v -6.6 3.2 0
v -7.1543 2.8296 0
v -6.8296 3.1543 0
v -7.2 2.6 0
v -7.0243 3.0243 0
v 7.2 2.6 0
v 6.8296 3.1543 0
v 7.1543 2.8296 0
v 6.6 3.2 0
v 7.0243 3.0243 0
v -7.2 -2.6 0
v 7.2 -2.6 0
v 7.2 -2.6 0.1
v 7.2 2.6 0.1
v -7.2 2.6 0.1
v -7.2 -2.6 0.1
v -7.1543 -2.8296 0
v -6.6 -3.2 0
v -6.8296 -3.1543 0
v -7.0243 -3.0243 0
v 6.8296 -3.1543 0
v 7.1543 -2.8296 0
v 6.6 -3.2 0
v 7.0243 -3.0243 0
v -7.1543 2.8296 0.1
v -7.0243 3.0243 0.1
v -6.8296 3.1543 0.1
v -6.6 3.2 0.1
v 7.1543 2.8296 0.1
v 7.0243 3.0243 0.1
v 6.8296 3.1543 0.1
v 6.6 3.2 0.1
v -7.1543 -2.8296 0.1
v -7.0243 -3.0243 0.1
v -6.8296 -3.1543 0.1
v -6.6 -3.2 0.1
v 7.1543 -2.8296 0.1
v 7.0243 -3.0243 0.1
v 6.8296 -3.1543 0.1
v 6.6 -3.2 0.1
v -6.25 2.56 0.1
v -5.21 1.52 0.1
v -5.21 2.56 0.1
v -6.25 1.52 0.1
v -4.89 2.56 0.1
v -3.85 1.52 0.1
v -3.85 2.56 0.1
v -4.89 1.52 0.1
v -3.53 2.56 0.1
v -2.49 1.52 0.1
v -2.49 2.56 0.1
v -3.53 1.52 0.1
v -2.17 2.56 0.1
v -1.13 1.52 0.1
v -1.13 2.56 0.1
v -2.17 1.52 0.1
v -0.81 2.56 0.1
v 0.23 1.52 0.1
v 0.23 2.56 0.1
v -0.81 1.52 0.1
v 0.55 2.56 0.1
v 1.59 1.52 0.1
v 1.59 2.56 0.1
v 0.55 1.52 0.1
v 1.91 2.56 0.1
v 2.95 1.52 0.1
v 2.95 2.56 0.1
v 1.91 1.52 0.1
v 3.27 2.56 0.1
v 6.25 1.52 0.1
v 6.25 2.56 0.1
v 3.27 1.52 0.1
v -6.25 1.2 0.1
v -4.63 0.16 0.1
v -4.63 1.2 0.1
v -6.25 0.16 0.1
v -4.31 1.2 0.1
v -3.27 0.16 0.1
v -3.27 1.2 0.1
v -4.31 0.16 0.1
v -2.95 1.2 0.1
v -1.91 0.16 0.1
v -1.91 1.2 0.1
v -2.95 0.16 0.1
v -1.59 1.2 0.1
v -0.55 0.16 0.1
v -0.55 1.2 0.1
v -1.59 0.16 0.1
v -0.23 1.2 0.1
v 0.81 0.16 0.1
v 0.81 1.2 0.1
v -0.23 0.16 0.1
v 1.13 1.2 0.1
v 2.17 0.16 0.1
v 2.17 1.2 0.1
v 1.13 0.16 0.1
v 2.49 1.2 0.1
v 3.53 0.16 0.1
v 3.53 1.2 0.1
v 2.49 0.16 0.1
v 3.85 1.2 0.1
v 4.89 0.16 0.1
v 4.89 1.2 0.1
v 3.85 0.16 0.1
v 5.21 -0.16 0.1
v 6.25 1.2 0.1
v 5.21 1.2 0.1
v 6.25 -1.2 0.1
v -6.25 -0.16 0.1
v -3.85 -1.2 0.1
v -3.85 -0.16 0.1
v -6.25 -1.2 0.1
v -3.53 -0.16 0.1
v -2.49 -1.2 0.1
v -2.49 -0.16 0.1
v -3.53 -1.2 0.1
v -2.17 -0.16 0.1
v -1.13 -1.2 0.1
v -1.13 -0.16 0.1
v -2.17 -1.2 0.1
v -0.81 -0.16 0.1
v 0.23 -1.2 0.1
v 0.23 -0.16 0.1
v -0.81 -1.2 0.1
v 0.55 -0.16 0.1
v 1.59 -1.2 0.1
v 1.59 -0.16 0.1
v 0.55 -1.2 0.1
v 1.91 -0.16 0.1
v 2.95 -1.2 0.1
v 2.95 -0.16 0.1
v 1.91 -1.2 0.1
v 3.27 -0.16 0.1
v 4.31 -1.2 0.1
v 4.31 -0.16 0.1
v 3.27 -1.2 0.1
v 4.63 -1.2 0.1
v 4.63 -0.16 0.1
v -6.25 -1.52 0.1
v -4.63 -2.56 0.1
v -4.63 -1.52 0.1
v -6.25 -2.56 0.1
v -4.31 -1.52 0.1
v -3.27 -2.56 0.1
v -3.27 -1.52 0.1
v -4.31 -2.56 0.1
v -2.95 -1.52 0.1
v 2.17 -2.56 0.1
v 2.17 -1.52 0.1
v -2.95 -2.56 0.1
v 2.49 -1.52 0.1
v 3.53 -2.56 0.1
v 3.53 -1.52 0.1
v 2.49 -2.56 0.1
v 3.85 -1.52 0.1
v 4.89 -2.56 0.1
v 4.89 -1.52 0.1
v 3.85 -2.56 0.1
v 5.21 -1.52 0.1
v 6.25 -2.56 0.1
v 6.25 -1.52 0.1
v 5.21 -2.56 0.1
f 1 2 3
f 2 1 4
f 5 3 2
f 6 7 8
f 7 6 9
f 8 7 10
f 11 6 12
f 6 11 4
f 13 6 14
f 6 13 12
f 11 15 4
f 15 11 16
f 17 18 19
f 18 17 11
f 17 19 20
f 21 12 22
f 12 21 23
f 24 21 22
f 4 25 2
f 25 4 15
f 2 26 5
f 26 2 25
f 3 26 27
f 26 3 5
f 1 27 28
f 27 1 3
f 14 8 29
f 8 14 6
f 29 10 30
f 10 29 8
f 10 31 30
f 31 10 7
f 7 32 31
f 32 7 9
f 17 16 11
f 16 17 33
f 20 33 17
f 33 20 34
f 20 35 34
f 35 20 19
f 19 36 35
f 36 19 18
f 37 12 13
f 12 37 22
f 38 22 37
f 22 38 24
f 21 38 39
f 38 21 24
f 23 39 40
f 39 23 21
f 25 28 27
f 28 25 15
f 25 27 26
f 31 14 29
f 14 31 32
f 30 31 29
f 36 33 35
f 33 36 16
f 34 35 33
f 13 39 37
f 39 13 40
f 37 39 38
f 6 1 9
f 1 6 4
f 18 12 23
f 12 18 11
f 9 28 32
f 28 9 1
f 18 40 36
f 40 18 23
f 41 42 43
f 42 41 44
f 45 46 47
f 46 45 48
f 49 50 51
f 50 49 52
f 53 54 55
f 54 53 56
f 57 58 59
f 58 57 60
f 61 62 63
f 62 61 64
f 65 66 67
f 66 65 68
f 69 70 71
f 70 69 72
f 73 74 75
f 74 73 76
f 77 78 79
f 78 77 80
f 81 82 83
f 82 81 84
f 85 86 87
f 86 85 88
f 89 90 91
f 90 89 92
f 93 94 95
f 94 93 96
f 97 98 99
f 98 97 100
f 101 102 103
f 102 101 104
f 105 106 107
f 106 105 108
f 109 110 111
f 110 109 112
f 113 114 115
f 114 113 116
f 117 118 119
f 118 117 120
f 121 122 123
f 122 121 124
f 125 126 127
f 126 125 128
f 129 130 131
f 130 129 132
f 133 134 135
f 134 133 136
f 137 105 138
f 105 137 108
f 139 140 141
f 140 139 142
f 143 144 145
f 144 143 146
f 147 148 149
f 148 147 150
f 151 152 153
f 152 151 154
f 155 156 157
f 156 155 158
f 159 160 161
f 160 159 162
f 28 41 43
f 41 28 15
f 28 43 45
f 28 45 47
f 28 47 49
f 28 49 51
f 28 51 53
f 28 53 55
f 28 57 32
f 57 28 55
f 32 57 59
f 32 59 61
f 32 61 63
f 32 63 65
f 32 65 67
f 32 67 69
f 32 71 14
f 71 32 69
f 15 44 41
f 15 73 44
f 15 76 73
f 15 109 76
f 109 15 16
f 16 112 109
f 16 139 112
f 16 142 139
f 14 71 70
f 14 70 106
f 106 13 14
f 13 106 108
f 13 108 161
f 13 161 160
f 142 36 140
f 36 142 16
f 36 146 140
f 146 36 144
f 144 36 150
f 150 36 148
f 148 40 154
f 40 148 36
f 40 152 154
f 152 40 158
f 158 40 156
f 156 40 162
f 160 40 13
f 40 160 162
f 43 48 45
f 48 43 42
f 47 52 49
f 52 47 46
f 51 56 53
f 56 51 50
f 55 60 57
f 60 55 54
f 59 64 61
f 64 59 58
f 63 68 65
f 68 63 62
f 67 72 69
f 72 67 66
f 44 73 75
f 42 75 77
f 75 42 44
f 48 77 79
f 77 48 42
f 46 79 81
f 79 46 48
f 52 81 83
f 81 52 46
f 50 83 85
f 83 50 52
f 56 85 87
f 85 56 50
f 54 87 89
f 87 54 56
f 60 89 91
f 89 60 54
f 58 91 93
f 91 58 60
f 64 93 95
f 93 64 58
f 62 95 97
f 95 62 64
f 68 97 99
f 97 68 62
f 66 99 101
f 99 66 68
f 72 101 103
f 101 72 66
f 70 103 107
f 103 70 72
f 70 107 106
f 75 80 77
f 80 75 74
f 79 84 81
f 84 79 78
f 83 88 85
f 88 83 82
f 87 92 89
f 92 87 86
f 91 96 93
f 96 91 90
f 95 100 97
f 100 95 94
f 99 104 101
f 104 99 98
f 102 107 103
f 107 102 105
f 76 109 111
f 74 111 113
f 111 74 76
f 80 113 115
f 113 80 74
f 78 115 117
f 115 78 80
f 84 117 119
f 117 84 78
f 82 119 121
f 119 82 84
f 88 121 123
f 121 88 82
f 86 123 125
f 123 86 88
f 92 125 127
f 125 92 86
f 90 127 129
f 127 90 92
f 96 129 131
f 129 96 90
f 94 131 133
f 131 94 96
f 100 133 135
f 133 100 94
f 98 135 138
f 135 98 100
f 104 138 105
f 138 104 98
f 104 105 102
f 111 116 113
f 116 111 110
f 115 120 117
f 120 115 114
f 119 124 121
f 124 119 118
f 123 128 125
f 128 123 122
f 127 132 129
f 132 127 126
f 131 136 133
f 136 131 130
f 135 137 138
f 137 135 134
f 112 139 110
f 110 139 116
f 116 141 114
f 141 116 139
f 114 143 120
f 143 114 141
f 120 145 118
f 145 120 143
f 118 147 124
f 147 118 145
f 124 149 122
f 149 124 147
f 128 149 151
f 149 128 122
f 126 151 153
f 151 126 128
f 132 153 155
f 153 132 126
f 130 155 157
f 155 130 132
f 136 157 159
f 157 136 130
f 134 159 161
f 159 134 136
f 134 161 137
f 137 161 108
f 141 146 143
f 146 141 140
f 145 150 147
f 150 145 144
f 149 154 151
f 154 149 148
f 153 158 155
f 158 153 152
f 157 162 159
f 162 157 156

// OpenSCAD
// file: ../p/box3u12.scad
use <../lib.scad>
function ldraw_lib__box3u12() = [
// 0 Box with 3 Parallel Faces without Any Edges
// 0 Name: box3u12.dat
// 0 Author: J.C. Tchang [tchang]
// 0 !LDRAW_ORG Primitive UPDATE 2014-02
// 0 !LICENSE Licensed under CC BY 4.0 : see CAreadme.txt
// 
// 0 BFC CERTIFY CCW
  [0,"BFC","CERTIFY"],
  [0,"BFC","CCW"],
// 
// 0 !HISTORY 2014-12-23 [PTadmin] Official Update 2014-02
// 
// 
// 4 16 -1 1 1 1 1 1 1 1 -1 -1 1 -1
  [4,16,-1,1,1,1,1,1,1,1,-1,-1,1,-1],
// 4 16 -1 1 1 -1 0 1 1 0 1 1 1 1
  [4,16,-1,1,1,-1,0,1,1,0,1,1,1,1],
// 4 16 1 1 -1 1 0 -1 -1 0 -1 -1 1 -1
  [4,16,1,1,-1,1,0,-1,-1,0,-1,-1,1,-1],
];
module ldraw_lib__box3u12(step=0, col=false, unit=2/5, alt=false, line=0.2, solid=!$preview)
    makepoly(ldraw_lib__box3u12(), step=step, col=col, unit=unit, alt=alt, line=line, solid=solid);
ldraw_lib__box3u12(line=0.2);
// file: ../p/1-4cyli.scad
use <../lib.scad>
function ldraw_lib__1_4cyli() = [
// 0 Cylinder 0.25
// 0 Name: 1-4cyli.dat
// 0 Author: James Jessiman
// 0 !LDRAW_ORG Primitive UPDATE 2012-01
// 0 !LICENSE Licensed under CC BY 4.0 : see CAreadme.txt
// 
// 0 BFC CERTIFY CCW
  [0,"BFC","CERTIFY"],
  [0,"BFC","CCW"],
// 
// 0 !HISTORY 2002-03-23 [sbliss] Added BFC statement.
// 0 !HISTORY 2002-04-25 [PTadmin] Official Update 2002-02
// 0 !HISTORY 2007-06-22 [PTadmin] Header formatted for Contributor Agreement
// 0 !HISTORY 2008-07-01 [PTadmin] Official Update 2008-01
// 0 !HISTORY 2012-02-16 [Philo] Changed to CCW
// 0 !HISTORY 2012-03-30 [PTadmin] Official Update 2012-01
// 
// 
// 4 16 1 1 0 0.9239 1 0.3827 0.9239 0 0.3827 1 0 0
  [4,16,1,1,0,0.9239,1,0.3827,0.9239,0,0.3827,1,0,0],
// 5 24 1 0 0 1 1 0 0.9239 0 0.3827 1 0 -1
  [5,24,1,0,0,1,1,0,0.9239,0,0.3827,1,0,-1],
// 4 16 0.9239 1 0.3827 0.7071 1 0.7071 0.7071 0 0.7071 0.9239 0 0.3827
  [4,16,0.9239,1,0.3827,0.7071,1,0.7071,0.7071,0,0.7071,0.9239,0,0.3827],
// 5 24 0.9239 0 0.3827 0.9239 1 0.3827 0.7071 0 0.7071 1 0 0
  [5,24,0.9239,0,0.3827,0.9239,1,0.3827,0.7071,0,0.7071,1,0,0],
// 4 16 0.7071 1 0.7071 0.3827 1 0.9239 0.3827 0 0.9239 0.7071 0 0.7071
  [4,16,0.7071,1,0.7071,0.3827,1,0.9239,0.3827,0,0.9239,0.7071,0,0.7071],
// 5 24 0.7071 0 0.7071 0.7071 1 0.7071 0.3827 0 0.9239 0.9239 0 0.3827
  [5,24,0.7071,0,0.7071,0.7071,1,0.7071,0.3827,0,0.9239,0.9239,0,0.3827],
// 4 16 0.3827 1 0.9239 0 1 1 0 0 1 0.3827 0 0.9239
  [4,16,0.3827,1,0.9239,0,1,1,0,0,1,0.3827,0,0.9239],
// 5 24 0.3827 0 0.9239 0.3827 1 0.9239 0 0 1 0.7071 0 0.7071
  [5,24,0.3827,0,0.9239,0.3827,1,0.9239,0,0,1,0.7071,0,0.7071],
// 5 24 0 0 1 0 1 1 0.3827 0 0.9239 -1 0 1
  [5,24,0,0,1,0,1,1,0.3827,0,0.9239,-1,0,1],
];
module ldraw_lib__1_4cyli(step=0, col=false, unit=2/5, alt=false, line=0.2, solid=!$preview)
    makepoly(ldraw_lib__1_4cyli(), step=step, col=col, unit=unit, alt=alt, line=line, solid=solid);
ldraw_lib__1_4cyli(line=0.2);
// file: ../p/1-4chrd.scad
use <../lib.scad>
function ldraw_lib__1_4chrd() = [
// 0 Chord 0.25
// 0 Name: 1-4chrd.dat
// 0 Author: Max Martin Richter [MMR1988]
// 0 !LDRAW_ORG Primitive UPDATE 2023-05
// 0 !LICENSE Licensed under CC BY 4.0 : see CAreadme.txt
// 
// 0 BFC CERTIFY CCW
  [0,"BFC","CERTIFY"],
  [0,"BFC","CCW"],
// 
// 0 !HISTORY 2004-04-22 [PTadmin] Official Update 2004-02
// 0 !HISTORY 2007-10-09 [PTadmin] Header formatted for Contributor Agreement
// 0 !HISTORY 2008-07-01 [PTadmin] Official Update 2008-01
// 0 !HISTORY 2012-08-02 [MMR1988] Re-creation with PrimGen2 and Rectifier
// 0 !HISTORY 2012-08-09 [PTadmin] Official Update 2012-02
// 0 !HISTORY 2023-10-27 [OrionP] Change author to MMR1988 from hafhead
// 0 !HISTORY 2023-10-31 [OrionP] Official Update 2023-05
// 
// 4 16 0.9239 0 0.3827 0.3827 0 0.9239 0 0 1 1 0 0
  [4,16,0.9239,0,0.3827,0.3827,0,0.9239,0,0,1,1,0,0],
// 3 16 0.7071 0 0.7071 0.3827 0 0.9239 0.9239 0 0.3827
  [3,16,0.7071,0,0.7071,0.3827,0,0.9239,0.9239,0,0.3827],
];
module ldraw_lib__1_4chrd(step=0, col=false, unit=2/5, alt=false, line=0.2, solid=!$preview)
    makepoly(ldraw_lib__1_4chrd(), step=step, col=col, unit=unit, alt=alt, line=line, solid=solid);
ldraw_lib__1_4chrd(line=0.2);
// main file
use <../lib.scad>
use <../p/1-4chrd.scad>
use <../p/1-4cyli.scad>
use <../p/box3u12.scad>
function ldraw_lib__6148328o() = [
// 0 Sticker  0.8 x  1.8 with Black Keyboard on Light Grey Background
// 0 Name: 6148328o.dat
// 0 Author: Massimo Maso [Sirio]
// 0 !LDRAW_ORG Part UPDATE 2024-08
// 0 !LICENSE Licensed under CC BY 4.0 : see CAreadme.txt
// 
// 0 BFC CERTIFY CCW
  [0,"BFC","CERTIFY"],
  [0,"BFC","CCW"],
// 
// 0 !KEYWORDS 917K, 919, Bricklink 75876stk01, Brickowl 852010, Hybrid, Pit Lane
// 0 !KEYWORDS Porsche, Rebrickable 26357, set 75876, Speed Champions
// 
// 0 !HISTORY 2024-09-30 [OrionP] Official Update 2024-08
// 
// 0 // Primitives
// 1 16 -16.5 0 6.5 -1.5 0 0 0 -1 0 0 0 1.5 1-4chrd.dat
  [1,16,-16.5,0,6.5,-1.5,0,0,0,-1,0,0,0,1.5, ldraw_lib__1_4chrd()],
// 1 16 16.5 0 6.5 1.5 0 0 0 -1 0 0 0 1.5 1-4chrd.dat
  [1,16,16.5,0,6.5,1.5,0,0,0,-1,0,0,0,1.5, ldraw_lib__1_4chrd()],
// 1 16 0 -.25 0 0 0 18 0 .25 0 6.5 0 0 box3u12.dat
  [1,16,0,-.25,0,0,0,18,0,.25,0,6.5,0,0, ldraw_lib__box3u12()],
// 1 16 -16.5 0 -6.5 -1.5 0 0 0 -1 0 0 0 -1.5 1-4chrd.dat
  [1,16,-16.5,0,-6.5,-1.5,0,0,0,-1,0,0,0,-1.5, ldraw_lib__1_4chrd()],
// 1 16 16.5 0 -6.5 1.5 0 0 0 -1 0 0 0 -1.5 1-4chrd.dat
  [1,16,16.5,0,-6.5,1.5,0,0,0,-1,0,0,0,-1.5, ldraw_lib__1_4chrd()],
// 1 16 -16.5 0 6.5 -1.5 0 0 0 -.25 0 0 0 1.5 1-4cyli.dat
  [1,16,-16.5,0,6.5,-1.5,0,0,0,-.25,0,0,0,1.5, ldraw_lib__1_4cyli()],
// 1 16 16.5 0 6.5 1.5 0 0 0 -.25 0 0 0 1.5 1-4cyli.dat
  [1,16,16.5,0,6.5,1.5,0,0,0,-.25,0,0,0,1.5, ldraw_lib__1_4cyli()],
// 1 16 -16.5 0 -6.5 -1.5 0 0 0 -.25 0 0 0 -1.5 1-4cyli.dat
  [1,16,-16.5,0,-6.5,-1.5,0,0,0,-.25,0,0,0,-1.5, ldraw_lib__1_4cyli()],
// 1 16 16.5 0 -6.5 1.5 0 0 0 -.25 0 0 0 -1.5 1-4cyli.dat
  [1,16,16.5,0,-6.5,1.5,0,0,0,-.25,0,0,0,-1.5, ldraw_lib__1_4cyli()],
// 1 71 -16.5 -.25 6.5 -1.5 0 0 0 1 0 0 0 1.5 1-4chrd.dat
  [1,71,-16.5,-.25,6.5,-1.5,0,0,0,1,0,0,0,1.5, ldraw_lib__1_4chrd()],
// 1 71 16.5 -.25 6.5 1.5 0 0 0 1 0 0 0 1.5 1-4chrd.dat
  [1,71,16.5,-.25,6.5,1.5,0,0,0,1,0,0,0,1.5, ldraw_lib__1_4chrd()],
// 1 71 -16.5 -.25 -6.5 -1.5 0 0 0 1 0 0 0 -1.5 1-4chrd.dat
  [1,71,-16.5,-.25,-6.5,-1.5,0,0,0,1,0,0,0,-1.5, ldraw_lib__1_4chrd()],
// 1 71 16.5 -.25 -6.5 1.5 0 0 0 1 0 0 0 -1.5 1-4chrd.dat
  [1,71,16.5,-.25,-6.5,1.5,0,0,0,1,0,0,0,-1.5, ldraw_lib__1_4chrd()],
// 0 // Bottom faces
// 4 16 16.5 0 8 18 0 6.5 -18 0 6.5 -16.5 0 8
  [4,16,16.5,0,8,18,0,6.5,-18,0,6.5,-16.5,0,8],
// 4 16 16.5 0 -8 -16.5 0 -8 -18 0 -6.5 18 0 -6.5
  [4,16,16.5,0,-8,-16.5,0,-8,-18,0,-6.5,18,0,-6.5],
// 0 // Lateral faces
// 4 16 -16.5 0 8 -16.5 -.25 8 16.5 -.25 8 16.5 0 8
  [4,16,-16.5,0,8,-16.5,-.25,8,16.5,-.25,8,16.5,0,8],
// 4 16 -16.5 0 -8 16.5 0 -8 16.5 -.25 -8 -16.5 -.25 -8
  [4,16,-16.5,0,-8,16.5,0,-8,16.5,-.25,-8,-16.5,-.25,-8],
// 0 // Top faces
// 0 // Black buttons
// 4 0 -15.625 -.25 6.4 -15.625 -.25 3.8 -13.025 -.25 3.8 -13.025 -.25 6.4
  [4,0,-15.625,-.25,6.4,-15.625,-.25,3.8,-13.025,-.25,3.8,-13.025,-.25,6.4],
// 4 0 -12.225 -.25 6.4 -12.225 -.25 3.8 -9.625 -.25 3.8 -9.625 -.25 6.4
  [4,0,-12.225,-.25,6.4,-12.225,-.25,3.8,-9.625,-.25,3.8,-9.625,-.25,6.4],
// 4 0 -8.825 -.25 6.4 -8.825 -.25 3.8 -6.225 -.25 3.8 -6.225 -.25 6.4
  [4,0,-8.825,-.25,6.4,-8.825,-.25,3.8,-6.225,-.25,3.8,-6.225,-.25,6.4],
// 4 0 -5.425 -.25 6.4 -5.425 -.25 3.8 -2.825 -.25 3.8 -2.825 -.25 6.4
  [4,0,-5.425,-.25,6.4,-5.425,-.25,3.8,-2.825,-.25,3.8,-2.825,-.25,6.4],
// 4 0 -2.025 -.25 6.4 -2.025 -.25 3.8 .575 -.25 3.8 .575 -.25 6.4
  [4,0,-2.025,-.25,6.4,-2.025,-.25,3.8,.575,-.25,3.8,.575,-.25,6.4],
// 4 0 1.375 -.25 6.4 1.375 -.25 3.8 3.975 -.25 3.8 3.975 -.25 6.4
  [4,0,1.375,-.25,6.4,1.375,-.25,3.8,3.975,-.25,3.8,3.975,-.25,6.4],
// 4 0 4.775 -.25 6.4 4.775 -.25 3.8 7.375 -.25 3.8 7.375 -.25 6.4
  [4,0,4.775,-.25,6.4,4.775,-.25,3.8,7.375,-.25,3.8,7.375,-.25,6.4],
// 4 0 8.175 -.25 6.4 8.175 -.25 3.8 15.625 -.25 3.8 15.625 -.25 6.4
  [4,0,8.175,-.25,6.4,8.175,-.25,3.8,15.625,-.25,3.8,15.625,-.25,6.4],
// 4 0 -15.625 -.25 3 -15.625 -.25 .4 -11.575 -.25 .4 -11.575 -.25 3
  [4,0,-15.625,-.25,3,-15.625,-.25,.4,-11.575,-.25,.4,-11.575,-.25,3],
// 4 0 -10.775 -.25 3 -10.775 -.25 .4 -8.175 -.25 .4 -8.175 -.25 3
  [4,0,-10.775,-.25,3,-10.775,-.25,.4,-8.175,-.25,.4,-8.175,-.25,3],
// 4 0 -7.375 -.25 3 -7.375 -.25 .4 -4.775 -.25 .4 -4.775 -.25 3
  [4,0,-7.375,-.25,3,-7.375,-.25,.4,-4.775,-.25,.4,-4.775,-.25,3],
// 4 0 -3.975 -.25 3 -3.975 -.25 .4 -1.375 -.25 .4 -1.375 -.25 3
  [4,0,-3.975,-.25,3,-3.975,-.25,.4,-1.375,-.25,.4,-1.375,-.25,3],
// 4 0 -.575 -.25 3 -.575 -.25 .4 2.025 -.25 .4 2.025 -.25 3
  [4,0,-.575,-.25,3,-.575,-.25,.4,2.025,-.25,.4,2.025,-.25,3],
// 4 0 2.825 -.25 3 2.825 -.25 .4 5.425 -.25 .4 5.425 -.25 3
  [4,0,2.825,-.25,3,2.825,-.25,.4,5.425,-.25,.4,5.425,-.25,3],
// 4 0 6.225 -.25 3 6.225 -.25 .4 8.825 -.25 .4 8.825 -.25 3
  [4,0,6.225,-.25,3,6.225,-.25,.4,8.825,-.25,.4,8.825,-.25,3],
// 4 0 9.625 -.25 3 9.625 -.25 .4 12.225 -.25 .4 12.225 -.25 3
  [4,0,9.625,-.25,3,9.625,-.25,.4,12.225,-.25,.4,12.225,-.25,3],
// 4 0 13.025 -.25 3 13.025 -.25 -.4 15.625 -.25 -3 15.625 -.25 3
  [4,0,13.025,-.25,3,13.025,-.25,-.4,15.625,-.25,-3,15.625,-.25,3],
// 4 0 -15.625 -.25 -.4 -15.625 -.25 -3 -9.625 -.25 -3 -9.625 -.25 -.4
  [4,0,-15.625,-.25,-.4,-15.625,-.25,-3,-9.625,-.25,-3,-9.625,-.25,-.4],
// 4 0 -8.825 -.25 -.4 -8.825 -.25 -3 -6.225 -.25 -3 -6.225 -.25 -.4
  [4,0,-8.825,-.25,-.4,-8.825,-.25,-3,-6.225,-.25,-3,-6.225,-.25,-.4],
// 4 0 -5.425 -.25 -.4 -5.425 -.25 -3 -2.825 -.25 -3 -2.825 -.25 -.4
  [4,0,-5.425,-.25,-.4,-5.425,-.25,-3,-2.825,-.25,-3,-2.825,-.25,-.4],
// 4 0 -2.025 -.25 -.4 -2.025 -.25 -3 .575 -.25 -3 .575 -.25 -.4
  [4,0,-2.025,-.25,-.4,-2.025,-.25,-3,.575,-.25,-3,.575,-.25,-.4],
// 4 0 1.375 -.25 -.4 1.375 -.25 -3 3.975 -.25 -3 3.975 -.25 -.4
  [4,0,1.375,-.25,-.4,1.375,-.25,-3,3.975,-.25,-3,3.975,-.25,-.4],
// 4 0 4.775 -.25 -.4 4.775 -.25 -3 7.375 -.25 -3 7.375 -.25 -.4
  [4,0,4.775,-.25,-.4,4.775,-.25,-3,7.375,-.25,-3,7.375,-.25,-.4],
// 4 0 8.175 -.25 -.4 8.175 -.25 -3 10.775 -.25 -3 10.775 -.25 -.4
  [4,0,8.175,-.25,-.4,8.175,-.25,-3,10.775,-.25,-3,10.775,-.25,-.4],
// 4 0 11.575 -.25 -.4 11.575 -.25 -3 15.625 -.25 -3 13.025 -.25 -.4
  [4,0,11.575,-.25,-.4,11.575,-.25,-3,15.625,-.25,-3,13.025,-.25,-.4],
// 4 0 -15.625 -.25 -3.8 -15.625 -.25 -6.4 -11.575 -.25 -6.4 -11.575 -.25 -3.8
  [4,0,-15.625,-.25,-3.8,-15.625,-.25,-6.4,-11.575,-.25,-6.4,-11.575,-.25,-3.8],
// 4 0 -10.775 -.25 -3.8 -10.775 -.25 -6.4 -8.175 -.25 -6.4 -8.175 -.25 -3.8
  [4,0,-10.775,-.25,-3.8,-10.775,-.25,-6.4,-8.175,-.25,-6.4,-8.175,-.25,-3.8],
// 4 0 -7.375 -.25 -3.8 -7.375 -.25 -6.4 5.425 -.25 -6.4 5.425 -.25 -3.8
  [4,0,-7.375,-.25,-3.8,-7.375,-.25,-6.4,5.425,-.25,-6.4,5.425,-.25,-3.8],
// 4 0 8.825 -.25 -3.8 6.225 -.25 -3.8 6.225 -.25 -6.4 8.825 -.25 -6.4
  [4,0,8.825,-.25,-3.8,6.225,-.25,-3.8,6.225,-.25,-6.4,8.825,-.25,-6.4],
// 4 0 12.225 -.25 -3.8 9.625 -.25 -3.8 9.625 -.25 -6.4 12.225 -.25 -6.4
  [4,0,12.225,-.25,-3.8,9.625,-.25,-3.8,9.625,-.25,-6.4,12.225,-.25,-6.4],
// 4 0 15.625 -.25 -3.8 13.025 -.25 -3.8 13.025 -.25 -6.4 15.625 -.25 -6.4
  [4,0,15.625,-.25,-3.8,13.025,-.25,-3.8,13.025,-.25,-6.4,15.625,-.25,-6.4],
// 0 // Grey bavkground
// 4 71 -16.5 -.25 8 -18 -.25 6.5 -15.625 -.25 6.4 -13.025 -.25 6.4
  [4,71,-16.5,-.25,8,-18,-.25,6.5,-15.625,-.25,6.4,-13.025,-.25,6.4],
// 3 71 -16.5 -.25 8 -13.025 -.25 6.4 -12.225 -.25 6.4
  [3,71,-16.5,-.25,8,-13.025,-.25,6.4,-12.225,-.25,6.4],
// 3 71 -16.5 -.25 8 -12.225 -.25 6.4 -9.625 -.25 6.4
  [3,71,-16.5,-.25,8,-12.225,-.25,6.4,-9.625,-.25,6.4],
// 3 71 -16.5 -.25 8 -9.625 -.25 6.4 -8.825 -.25 6.4
  [3,71,-16.5,-.25,8,-9.625,-.25,6.4,-8.825,-.25,6.4],
// 3 71 -16.5 -.25 8 -8.825 -.25 6.4 -6.225 -.25 6.4
  [3,71,-16.5,-.25,8,-8.825,-.25,6.4,-6.225,-.25,6.4],
// 3 71 -16.5 -.25 8 -6.225 -.25 6.4 -5.425 -.25 6.4
  [3,71,-16.5,-.25,8,-6.225,-.25,6.4,-5.425,-.25,6.4],
// 3 71 -16.5 -.25 8 -5.425 -.25 6.4 -2.825 -.25 6.4
  [3,71,-16.5,-.25,8,-5.425,-.25,6.4,-2.825,-.25,6.4],
// 4 71 -16.5 -.25 8 -2.825 -.25 6.4 -2.025 -.25 6.4 16.5 -.25 8
  [4,71,-16.5,-.25,8,-2.825,-.25,6.4,-2.025,-.25,6.4,16.5,-.25,8],
// 3 71 16.5 -.25 8 -2.025 -.25 6.4 .575 -.25 6.4
  [3,71,16.5,-.25,8,-2.025,-.25,6.4,.575,-.25,6.4],
// 3 71 16.5 -.25 8 .575 -.25 6.4 1.375 -.25 6.4
  [3,71,16.5,-.25,8,.575,-.25,6.4,1.375,-.25,6.4],
// 3 71 16.5 -.25 8 1.375 -.25 6.4 3.975 -.25 6.4
  [3,71,16.5,-.25,8,1.375,-.25,6.4,3.975,-.25,6.4],
// 3 71 16.5 -.25 8 3.975 -.25 6.4 4.775 -.25 6.4
  [3,71,16.5,-.25,8,3.975,-.25,6.4,4.775,-.25,6.4],
// 3 71 16.5 -.25 8 4.775 -.25 6.4 7.375 -.25 6.4
  [3,71,16.5,-.25,8,4.775,-.25,6.4,7.375,-.25,6.4],
// 3 71 16.5 -.25 8 7.375 -.25 6.4 8.175 -.25 6.4
  [3,71,16.5,-.25,8,7.375,-.25,6.4,8.175,-.25,6.4],
// 4 71 16.5 -.25 8 8.175 -.25 6.4 15.625 -.25 6.4 18 -.25 6.5
  [4,71,16.5,-.25,8,8.175,-.25,6.4,15.625,-.25,6.4,18,-.25,6.5],
// 3 71 -18 -.25 6.5 -15.625 -.25 3.8 -15.625 -.25 6.4
  [3,71,-18,-.25,6.5,-15.625,-.25,3.8,-15.625,-.25,6.4],
// 3 71 -18 -.25 6.5 -15.625 -.25 3 -15.625 -.25 3.8
  [3,71,-18,-.25,6.5,-15.625,-.25,3,-15.625,-.25,3.8],
// 3 71 -18 -.25 6.5 -15.625 -.25 .4 -15.625 -.25 3
  [3,71,-18,-.25,6.5,-15.625,-.25,.4,-15.625,-.25,3],
// 4 71 -18 -.25 6.5 -18 -.25 -6.5 -15.625 -.25 -.4 -15.625 -.25 .4
  [4,71,-18,-.25,6.5,-18,-.25,-6.5,-15.625,-.25,-.4,-15.625,-.25,.4],
// 3 71 -18 -.25 -6.5 -15.625 -.25 -3 -15.625 -.25 -.4
  [3,71,-18,-.25,-6.5,-15.625,-.25,-3,-15.625,-.25,-.4],
// 3 71 -18 -.25 -6.5 -15.625 -.25 -3.8 -15.625 -.25 -3
  [3,71,-18,-.25,-6.5,-15.625,-.25,-3.8,-15.625,-.25,-3],
// 3 71 -18 -.25 -6.5 -15.625 -.25 -6.4 -15.625 -.25 -3.8
  [3,71,-18,-.25,-6.5,-15.625,-.25,-6.4,-15.625,-.25,-3.8],
// 3 71 18 -.25 6.5 15.625 -.25 6.4 15.625 -.25 3.8
  [3,71,18,-.25,6.5,15.625,-.25,6.4,15.625,-.25,3.8],
// 3 71 18 -.25 6.5 15.625 -.25 3.8 15.625 -.25 3
  [3,71,18,-.25,6.5,15.625,-.25,3.8,15.625,-.25,3],
// 4 71 18 -.25 6.5 15.625 -.25 3 15.625 -.25 -3 18 -.25 -6.5
  [4,71,18,-.25,6.5,15.625,-.25,3,15.625,-.25,-3,18,-.25,-6.5],
// 3 71 18 -.25 -6.5 15.625 -.25 -3 15.625 -.25 -3.8
  [3,71,18,-.25,-6.5,15.625,-.25,-3,15.625,-.25,-3.8],
// 3 71 18 -.25 -6.5 15.625 -.25 -3.8 15.625 -.25 -6.4
  [3,71,18,-.25,-6.5,15.625,-.25,-3.8,15.625,-.25,-6.4],
// 4 71 -16.5 -.25 -8 -11.575 -.25 -6.4 -15.625 -.25 -6.4 -18 -.25 -6.5
  [4,71,-16.5,-.25,-8,-11.575,-.25,-6.4,-15.625,-.25,-6.4,-18,-.25,-6.5],
// 3 71 -16.5 -.25 -8 -10.775 -.25 -6.4 -11.575 -.25 -6.4
  [3,71,-16.5,-.25,-8,-10.775,-.25,-6.4,-11.575,-.25,-6.4],
// 3 71 -10.775 -.25 -6.4 -16.5 -.25 -8 -8.175 -.25 -6.4
  [3,71,-10.775,-.25,-6.4,-16.5,-.25,-8,-8.175,-.25,-6.4],
// 3 71 -8.175 -.25 -6.4 -16.5 -.25 -8 -7.375 -.25 -6.4
  [3,71,-8.175,-.25,-6.4,-16.5,-.25,-8,-7.375,-.25,-6.4],
// 3 71 -7.375 -.25 -6.4 -16.5 -.25 -8 5.425 -.25 -6.4
  [3,71,-7.375,-.25,-6.4,-16.5,-.25,-8,5.425,-.25,-6.4],
// 4 71 -16.5 -.25 -8 16.5 -.25 -8 6.225 -.25 -6.4 5.425 -.25 -6.4
  [4,71,-16.5,-.25,-8,16.5,-.25,-8,6.225,-.25,-6.4,5.425,-.25,-6.4],
// 3 71 16.5 -.25 -8 8.825 -.25 -6.4 6.225 -.25 -6.4
  [3,71,16.5,-.25,-8,8.825,-.25,-6.4,6.225,-.25,-6.4],
// 3 71 8.825 -.25 -6.4 16.5 -.25 -8 9.625 -.25 -6.4
  [3,71,8.825,-.25,-6.4,16.5,-.25,-8,9.625,-.25,-6.4],
// 3 71 9.625 -.25 -6.4 16.5 -.25 -8 12.225 -.25 -6.4
  [3,71,9.625,-.25,-6.4,16.5,-.25,-8,12.225,-.25,-6.4],
// 3 71 12.225 -.25 -6.4 16.5 -.25 -8 13.025 -.25 -6.4
  [3,71,12.225,-.25,-6.4,16.5,-.25,-8,13.025,-.25,-6.4],
// 4 71 16.5 -.25 -8 18 -.25 -6.5 15.625 -.25 -6.4 13.025 -.25 -6.4
  [4,71,16.5,-.25,-8,18,-.25,-6.5,15.625,-.25,-6.4,13.025,-.25,-6.4],
// 4 71 -13.025 -.25 6.4 -13.025 -.25 3.8 -12.225 -.25 3.8 -12.225 -.25 6.4
  [4,71,-13.025,-.25,6.4,-13.025,-.25,3.8,-12.225,-.25,3.8,-12.225,-.25,6.4],
// 4 71 -9.625 -.25 6.4 -9.625 -.25 3.8 -8.825 -.25 3.8 -8.825 -.25 6.4
  [4,71,-9.625,-.25,6.4,-9.625,-.25,3.8,-8.825,-.25,3.8,-8.825,-.25,6.4],
// 4 71 -6.225 -.25 6.4 -6.225 -.25 3.8 -5.425 -.25 3.8 -5.425 -.25 6.4
  [4,71,-6.225,-.25,6.4,-6.225,-.25,3.8,-5.425,-.25,3.8,-5.425,-.25,6.4],
// 4 71 -2.825 -.25 6.4 -2.825 -.25 3.8 -2.025 -.25 3.8 -2.025 -.25 6.4
  [4,71,-2.825,-.25,6.4,-2.825,-.25,3.8,-2.025,-.25,3.8,-2.025,-.25,6.4],
// 4 71 .575 -.25 6.4 .575 -.25 3.8 1.375 -.25 3.8 1.375 -.25 6.4
  [4,71,.575,-.25,6.4,.575,-.25,3.8,1.375,-.25,3.8,1.375,-.25,6.4],
// 4 71 3.975 -.25 6.4 3.975 -.25 3.8 4.775 -.25 3.8 4.775 -.25 6.4
  [4,71,3.975,-.25,6.4,3.975,-.25,3.8,4.775,-.25,3.8,4.775,-.25,6.4],
// 4 71 7.375 -.25 6.4 7.375 -.25 3.8 8.175 -.25 3.8 8.175 -.25 6.4
  [4,71,7.375,-.25,6.4,7.375,-.25,3.8,8.175,-.25,3.8,8.175,-.25,6.4],
// 3 71 -15.625 -.25 3.8 -15.625 -.25 3 -11.575 -.25 3
  [3,71,-15.625,-.25,3.8,-15.625,-.25,3,-11.575,-.25,3],
// 4 71 -15.625 -.25 3.8 -11.575 -.25 3 -10.775 -.25 3 -13.025 -.25 3.8
  [4,71,-15.625,-.25,3.8,-11.575,-.25,3,-10.775,-.25,3,-13.025,-.25,3.8],
// 4 71 -13.025 -.25 3.8 -10.775 -.25 3 -8.175 -.25 3 -12.225 -.25 3.8
  [4,71,-13.025,-.25,3.8,-10.775,-.25,3,-8.175,-.25,3,-12.225,-.25,3.8],
// 4 71 -12.225 -.25 3.8 -8.175 -.25 3 -7.375 -.25 3 -9.625 -.25 3.8
  [4,71,-12.225,-.25,3.8,-8.175,-.25,3,-7.375,-.25,3,-9.625,-.25,3.8],
// 4 71 -9.625 -.25 3.8 -7.375 -.25 3 -4.775 -.25 3 -8.825 -.25 3.8
  [4,71,-9.625,-.25,3.8,-7.375,-.25,3,-4.775,-.25,3,-8.825,-.25,3.8],
// 4 71 -8.825 -.25 3.8 -4.775 -.25 3 -3.975 -.25 3 -6.225 -.25 3.8
  [4,71,-8.825,-.25,3.8,-4.775,-.25,3,-3.975,-.25,3,-6.225,-.25,3.8],
// 4 71 -6.225 -.25 3.8 -3.975 -.25 3 -1.375 -.25 3 -5.425 -.25 3.8
  [4,71,-6.225,-.25,3.8,-3.975,-.25,3,-1.375,-.25,3,-5.425,-.25,3.8],
// 4 71 -5.425 -.25 3.8 -1.375 -.25 3 -.575 -.25 3 -2.825 -.25 3.8
  [4,71,-5.425,-.25,3.8,-1.375,-.25,3,-.575,-.25,3,-2.825,-.25,3.8],
// 4 71 -2.825 -.25 3.8 -.575 -.25 3 2.025 -.25 3 -2.025 -.25 3.8
  [4,71,-2.825,-.25,3.8,-.575,-.25,3,2.025,-.25,3,-2.025,-.25,3.8],
// 4 71 -2.025 -.25 3.8 2.025 -.25 3 2.825 -.25 3 .575 -.25 3.8
  [4,71,-2.025,-.25,3.8,2.025,-.25,3,2.825,-.25,3,.575,-.25,3.8],
// 4 71 .575 -.25 3.8 2.825 -.25 3 5.425 -.25 3 1.375 -.25 3.8
  [4,71,.575,-.25,3.8,2.825,-.25,3,5.425,-.25,3,1.375,-.25,3.8],
// 4 71 1.375 -.25 3.8 5.425 -.25 3 6.225 -.25 3 3.975 -.25 3.8
  [4,71,1.375,-.25,3.8,5.425,-.25,3,6.225,-.25,3,3.975,-.25,3.8],
// 4 71 3.975 -.25 3.8 6.225 -.25 3 8.825 -.25 3 4.775 -.25 3.8
  [4,71,3.975,-.25,3.8,6.225,-.25,3,8.825,-.25,3,4.775,-.25,3.8],
// 4 71 4.775 -.25 3.8 8.825 -.25 3 9.625 -.25 3 7.375 -.25 3.8
  [4,71,4.775,-.25,3.8,8.825,-.25,3,9.625,-.25,3,7.375,-.25,3.8],
// 4 71 7.375 -.25 3.8 9.625 -.25 3 12.225 -.25 3 8.175 -.25 3.8
  [4,71,7.375,-.25,3.8,9.625,-.25,3,12.225,-.25,3,8.175,-.25,3.8],
// 4 71 8.175 -.25 3.8 12.225 -.25 3 13.025 -.25 3 15.625 -.25 3.8
  [4,71,8.175,-.25,3.8,12.225,-.25,3,13.025,-.25,3,15.625,-.25,3.8],
// 3 71 15.625 -.25 3.8 13.025 -.25 3 15.625 -.25 3
  [3,71,15.625,-.25,3.8,13.025,-.25,3,15.625,-.25,3],
// 4 71 -11.575 -.25 3 -11.575 -.25 .4 -10.775 -.25 .4 -10.775 -.25 3
  [4,71,-11.575,-.25,3,-11.575,-.25,.4,-10.775,-.25,.4,-10.775,-.25,3],
// 4 71 -8.175 -.25 3 -8.175 -.25 .4 -7.375 -.25 .4 -7.375 -.25 3
  [4,71,-8.175,-.25,3,-8.175,-.25,.4,-7.375,-.25,.4,-7.375,-.25,3],
// 4 71 -4.775 -.25 3 -4.775 -.25 .4 -3.975 -.25 .4 -3.975 -.25 3
  [4,71,-4.775,-.25,3,-4.775,-.25,.4,-3.975,-.25,.4,-3.975,-.25,3],
// 4 71 -1.375 -.25 3 -1.375 -.25 .4 -.575 -.25 .4 -.575 -.25 3
  [4,71,-1.375,-.25,3,-1.375,-.25,.4,-.575,-.25,.4,-.575,-.25,3],
// 4 71 2.025 -.25 3 2.025 -.25 .4 2.825 -.25 .4 2.825 -.25 3
  [4,71,2.025,-.25,3,2.025,-.25,.4,2.825,-.25,.4,2.825,-.25,3],
// 4 71 5.425 -.25 3 5.425 -.25 .4 6.225 -.25 .4 6.225 -.25 3
  [4,71,5.425,-.25,3,5.425,-.25,.4,6.225,-.25,.4,6.225,-.25,3],
// 4 71 8.825 -.25 3 8.825 -.25 .4 9.625 -.25 .4 9.625 -.25 3
  [4,71,8.825,-.25,3,8.825,-.25,.4,9.625,-.25,.4,9.625,-.25,3],
// 4 71 12.225 -.25 3 12.225 -.25 .4 13.025 -.25 -.4 13.025 -.25 3
  [4,71,12.225,-.25,3,12.225,-.25,.4,13.025,-.25,-.4,13.025,-.25,3],
// 3 71 -15.625 -.25 .4 -15.625 -.25 -.4 -9.625 -.25 -.4
  [3,71,-15.625,-.25,.4,-15.625,-.25,-.4,-9.625,-.25,-.4],
// 4 71 -15.625 -.25 .4 -9.625 -.25 -.4 -8.825 -.25 -.4 -11.575 -.25 .4
  [4,71,-15.625,-.25,.4,-9.625,-.25,-.4,-8.825,-.25,-.4,-11.575,-.25,.4],
// 4 71 -11.575 -.25 .4 -8.825 -.25 -.4 -6.225 -.25 -.4 -10.775 -.25 .4
  [4,71,-11.575,-.25,.4,-8.825,-.25,-.4,-6.225,-.25,-.4,-10.775,-.25,.4],
// 4 71 -10.775 -.25 .4 -6.225 -.25 -.4 -5.425 -.25 -.4 -8.175 -.25 .4
  [4,71,-10.775,-.25,.4,-6.225,-.25,-.4,-5.425,-.25,-.4,-8.175,-.25,.4],
// 4 71 -8.175 -.25 .4 -5.425 -.25 -.4 -2.825 -.25 -.4 -7.375 -.25 .4
  [4,71,-8.175,-.25,.4,-5.425,-.25,-.4,-2.825,-.25,-.4,-7.375,-.25,.4],
// 4 71 -7.375 -.25 .4 -2.825 -.25 -.4 -2.025 -.25 -.4 -4.775 -.25 .4
  [4,71,-7.375,-.25,.4,-2.825,-.25,-.4,-2.025,-.25,-.4,-4.775,-.25,.4],
// 4 71 -4.775 -.25 .4 -2.025 -.25 -.4 .575 -.25 -.4 -3.975 -.25 .4
  [4,71,-4.775,-.25,.4,-2.025,-.25,-.4,.575,-.25,-.4,-3.975,-.25,.4],
// 4 71 -3.975 -.25 .4 .575 -.25 -.4 1.375 -.25 -.4 -1.375 -.25 .4
  [4,71,-3.975,-.25,.4,.575,-.25,-.4,1.375,-.25,-.4,-1.375,-.25,.4],
// 4 71 -1.375 -.25 .4 1.375 -.25 -.4 3.975 -.25 -.4 -.575 -.25 .4
  [4,71,-1.375,-.25,.4,1.375,-.25,-.4,3.975,-.25,-.4,-.575,-.25,.4],
// 4 71 -.575 -.25 .4 3.975 -.25 -.4 4.775 -.25 -.4 2.025 -.25 .4
  [4,71,-.575,-.25,.4,3.975,-.25,-.4,4.775,-.25,-.4,2.025,-.25,.4],
// 4 71 2.025 -.25 .4 4.775 -.25 -.4 7.375 -.25 -.4 2.825 -.25 .4
  [4,71,2.025,-.25,.4,4.775,-.25,-.4,7.375,-.25,-.4,2.825,-.25,.4],
// 4 71 2.825 -.25 .4 7.375 -.25 -.4 8.175 -.25 -.4 5.425 -.25 .4
  [4,71,2.825,-.25,.4,7.375,-.25,-.4,8.175,-.25,-.4,5.425,-.25,.4],
// 4 71 5.425 -.25 .4 8.175 -.25 -.4 10.775 -.25 -.4 6.225 -.25 .4
  [4,71,5.425,-.25,.4,8.175,-.25,-.4,10.775,-.25,-.4,6.225,-.25,.4],
// 4 71 6.225 -.25 .4 10.775 -.25 -.4 11.575 -.25 -.4 8.825 -.25 .4
  [4,71,6.225,-.25,.4,10.775,-.25,-.4,11.575,-.25,-.4,8.825,-.25,.4],
// 4 71 8.825 -.25 .4 11.575 -.25 -.4 13.025 -.25 -.4 9.625 -.25 .4
  [4,71,8.825,-.25,.4,11.575,-.25,-.4,13.025,-.25,-.4,9.625,-.25,.4],
// 3 71 9.625 -.25 .4 13.025 -.25 -.4 12.225 -.25 .4
  [3,71,9.625,-.25,.4,13.025,-.25,-.4,12.225,-.25,.4],
// 4 71 -9.625 -.25 -.4 -9.625 -.25 -3 -8.825 -.25 -3 -8.825 -.25 -.4
  [4,71,-9.625,-.25,-.4,-9.625,-.25,-3,-8.825,-.25,-3,-8.825,-.25,-.4],
// 4 71 -6.225 -.25 -.4 -6.225 -.25 -3 -5.425 -.25 -3 -5.425 -.25 -.4
  [4,71,-6.225,-.25,-.4,-6.225,-.25,-3,-5.425,-.25,-3,-5.425,-.25,-.4],
// 4 71 -2.825 -.25 -.4 -2.825 -.25 -3 -2.025 -.25 -3 -2.025 -.25 -.4
  [4,71,-2.825,-.25,-.4,-2.825,-.25,-3,-2.025,-.25,-3,-2.025,-.25,-.4],
// 4 71 .575 -.25 -.4 .575 -.25 -3 1.375 -.25 -3 1.375 -.25 -.4
  [4,71,.575,-.25,-.4,.575,-.25,-3,1.375,-.25,-3,1.375,-.25,-.4],
// 4 71 3.975 -.25 -.4 3.975 -.25 -3 4.775 -.25 -3 4.775 -.25 -.4
  [4,71,3.975,-.25,-.4,3.975,-.25,-3,4.775,-.25,-3,4.775,-.25,-.4],
// 4 71 7.375 -.25 -.4 7.375 -.25 -3 8.175 -.25 -3 8.175 -.25 -.4
  [4,71,7.375,-.25,-.4,7.375,-.25,-3,8.175,-.25,-3,8.175,-.25,-.4],
// 4 71 10.775 -.25 -.4 10.775 -.25 -3 11.575 -.25 -3 11.575 -.25 -.4
  [4,71,10.775,-.25,-.4,10.775,-.25,-3,11.575,-.25,-3,11.575,-.25,-.4],
// 3 71 -15.625 -.25 -3 -15.625 -.25 -3.8 -9.625 -.25 -3
  [3,71,-15.625,-.25,-3,-15.625,-.25,-3.8,-9.625,-.25,-3],
// 3 71 -9.625 -.25 -3 -15.625 -.25 -3.8 -8.825 -.25 -3
  [3,71,-9.625,-.25,-3,-15.625,-.25,-3.8,-8.825,-.25,-3],
// 4 71 -8.825 -.25 -3 -15.625 -.25 -3.8 -11.575 -.25 -3.8 -6.225 -.25 -3
  [4,71,-8.825,-.25,-3,-15.625,-.25,-3.8,-11.575,-.25,-3.8,-6.225,-.25,-3],
// 4 71 -6.225 -.25 -3 -11.575 -.25 -3.8 -10.775 -.25 -3.8 -5.425 -.25 -3
  [4,71,-6.225,-.25,-3,-11.575,-.25,-3.8,-10.775,-.25,-3.8,-5.425,-.25,-3],
// 4 71 -5.425 -.25 -3 -10.775 -.25 -3.8 -8.175 -.25 -3.8 -2.825 -.25 -3
  [4,71,-5.425,-.25,-3,-10.775,-.25,-3.8,-8.175,-.25,-3.8,-2.825,-.25,-3],
// 4 71 -2.825 -.25 -3 -8.175 -.25 -3.8 -7.375 -.25 -3.8 -2.025 -.25 -3
  [4,71,-2.825,-.25,-3,-8.175,-.25,-3.8,-7.375,-.25,-3.8,-2.025,-.25,-3],
// 4 71 -2.025 -.25 -3 -7.375 -.25 -3.8 5.425 -.25 -3.8 .575 -.25 -3
  [4,71,-2.025,-.25,-3,-7.375,-.25,-3.8,5.425,-.25,-3.8,.575,-.25,-3],
// 4 71 .575 -.25 -3 5.425 -.25 -3.8 6.225 -.25 -3.8 1.375 -.25 -3
  [4,71,.575,-.25,-3,5.425,-.25,-3.8,6.225,-.25,-3.8,1.375,-.25,-3],
// 4 71 1.375 -.25 -3 6.225 -.25 -3.8 8.825 -.25 -3.8 3.975 -.25 -3
  [4,71,1.375,-.25,-3,6.225,-.25,-3.8,8.825,-.25,-3.8,3.975,-.25,-3],
// 4 71 3.975 -.25 -3 8.825 -.25 -3.8 9.625 -.25 -3.8 4.775 -.25 -3
  [4,71,3.975,-.25,-3,8.825,-.25,-3.8,9.625,-.25,-3.8,4.775,-.25,-3],
// 4 71 4.775 -.25 -3 9.625 -.25 -3.8 12.225 -.25 -3.8 7.375 -.25 -3
  [4,71,4.775,-.25,-3,9.625,-.25,-3.8,12.225,-.25,-3.8,7.375,-.25,-3],
// 4 71 7.375 -.25 -3 12.225 -.25 -3.8 13.025 -.25 -3.8 8.175 -.25 -3
  [4,71,7.375,-.25,-3,12.225,-.25,-3.8,13.025,-.25,-3.8,8.175,-.25,-3],
// 4 71 8.175 -.25 -3 13.025 -.25 -3.8 15.625 -.25 -3.8 10.775 -.25 -3
  [4,71,8.175,-.25,-3,13.025,-.25,-3.8,15.625,-.25,-3.8,10.775,-.25,-3],
// 3 71 10.775 -.25 -3 15.625 -.25 -3.8 11.575 -.25 -3
  [3,71,10.775,-.25,-3,15.625,-.25,-3.8,11.575,-.25,-3],
// 3 71 11.575 -.25 -3 15.625 -.25 -3.8 15.625 -.25 -3
  [3,71,11.575,-.25,-3,15.625,-.25,-3.8,15.625,-.25,-3],
// 4 71 -11.575 -.25 -3.8 -11.575 -.25 -6.4 -10.775 -.25 -6.4 -10.775 -.25 -3.8
  [4,71,-11.575,-.25,-3.8,-11.575,-.25,-6.4,-10.775,-.25,-6.4,-10.775,-.25,-3.8],
// 4 71 -8.175 -.25 -3.8 -8.175 -.25 -6.4 -7.375 -.25 -6.4 -7.375 -.25 -3.8
  [4,71,-8.175,-.25,-3.8,-8.175,-.25,-6.4,-7.375,-.25,-6.4,-7.375,-.25,-3.8],
// 4 71 5.425 -.25 -3.8 5.425 -.25 -6.4 6.225 -.25 -6.4 6.225 -.25 -3.8
  [4,71,5.425,-.25,-3.8,5.425,-.25,-6.4,6.225,-.25,-6.4,6.225,-.25,-3.8],
// 4 71 8.825 -.25 -3.8 8.825 -.25 -6.4 9.625 -.25 -6.4 9.625 -.25 -3.8
  [4,71,8.825,-.25,-3.8,8.825,-.25,-6.4,9.625,-.25,-6.4,9.625,-.25,-3.8],
// 4 71 12.225 -.25 -3.8 12.225 -.25 -6.4 13.025 -.25 -6.4 13.025 -.25 -3.8
  [4,71,12.225,-.25,-3.8,12.225,-.25,-6.4,13.025,-.25,-6.4,13.025,-.25,-3.8],
];
module ldraw_lib__6148328o(step=0, col=false, unit=2/5, alt=false, line=0.2, solid=!$preview)
    makepoly(ldraw_lib__6148328o(), step=step, col=col, unit=unit, alt=alt, line=line, solid=solid);
ldraw_lib__6148328o(line=0.2);
